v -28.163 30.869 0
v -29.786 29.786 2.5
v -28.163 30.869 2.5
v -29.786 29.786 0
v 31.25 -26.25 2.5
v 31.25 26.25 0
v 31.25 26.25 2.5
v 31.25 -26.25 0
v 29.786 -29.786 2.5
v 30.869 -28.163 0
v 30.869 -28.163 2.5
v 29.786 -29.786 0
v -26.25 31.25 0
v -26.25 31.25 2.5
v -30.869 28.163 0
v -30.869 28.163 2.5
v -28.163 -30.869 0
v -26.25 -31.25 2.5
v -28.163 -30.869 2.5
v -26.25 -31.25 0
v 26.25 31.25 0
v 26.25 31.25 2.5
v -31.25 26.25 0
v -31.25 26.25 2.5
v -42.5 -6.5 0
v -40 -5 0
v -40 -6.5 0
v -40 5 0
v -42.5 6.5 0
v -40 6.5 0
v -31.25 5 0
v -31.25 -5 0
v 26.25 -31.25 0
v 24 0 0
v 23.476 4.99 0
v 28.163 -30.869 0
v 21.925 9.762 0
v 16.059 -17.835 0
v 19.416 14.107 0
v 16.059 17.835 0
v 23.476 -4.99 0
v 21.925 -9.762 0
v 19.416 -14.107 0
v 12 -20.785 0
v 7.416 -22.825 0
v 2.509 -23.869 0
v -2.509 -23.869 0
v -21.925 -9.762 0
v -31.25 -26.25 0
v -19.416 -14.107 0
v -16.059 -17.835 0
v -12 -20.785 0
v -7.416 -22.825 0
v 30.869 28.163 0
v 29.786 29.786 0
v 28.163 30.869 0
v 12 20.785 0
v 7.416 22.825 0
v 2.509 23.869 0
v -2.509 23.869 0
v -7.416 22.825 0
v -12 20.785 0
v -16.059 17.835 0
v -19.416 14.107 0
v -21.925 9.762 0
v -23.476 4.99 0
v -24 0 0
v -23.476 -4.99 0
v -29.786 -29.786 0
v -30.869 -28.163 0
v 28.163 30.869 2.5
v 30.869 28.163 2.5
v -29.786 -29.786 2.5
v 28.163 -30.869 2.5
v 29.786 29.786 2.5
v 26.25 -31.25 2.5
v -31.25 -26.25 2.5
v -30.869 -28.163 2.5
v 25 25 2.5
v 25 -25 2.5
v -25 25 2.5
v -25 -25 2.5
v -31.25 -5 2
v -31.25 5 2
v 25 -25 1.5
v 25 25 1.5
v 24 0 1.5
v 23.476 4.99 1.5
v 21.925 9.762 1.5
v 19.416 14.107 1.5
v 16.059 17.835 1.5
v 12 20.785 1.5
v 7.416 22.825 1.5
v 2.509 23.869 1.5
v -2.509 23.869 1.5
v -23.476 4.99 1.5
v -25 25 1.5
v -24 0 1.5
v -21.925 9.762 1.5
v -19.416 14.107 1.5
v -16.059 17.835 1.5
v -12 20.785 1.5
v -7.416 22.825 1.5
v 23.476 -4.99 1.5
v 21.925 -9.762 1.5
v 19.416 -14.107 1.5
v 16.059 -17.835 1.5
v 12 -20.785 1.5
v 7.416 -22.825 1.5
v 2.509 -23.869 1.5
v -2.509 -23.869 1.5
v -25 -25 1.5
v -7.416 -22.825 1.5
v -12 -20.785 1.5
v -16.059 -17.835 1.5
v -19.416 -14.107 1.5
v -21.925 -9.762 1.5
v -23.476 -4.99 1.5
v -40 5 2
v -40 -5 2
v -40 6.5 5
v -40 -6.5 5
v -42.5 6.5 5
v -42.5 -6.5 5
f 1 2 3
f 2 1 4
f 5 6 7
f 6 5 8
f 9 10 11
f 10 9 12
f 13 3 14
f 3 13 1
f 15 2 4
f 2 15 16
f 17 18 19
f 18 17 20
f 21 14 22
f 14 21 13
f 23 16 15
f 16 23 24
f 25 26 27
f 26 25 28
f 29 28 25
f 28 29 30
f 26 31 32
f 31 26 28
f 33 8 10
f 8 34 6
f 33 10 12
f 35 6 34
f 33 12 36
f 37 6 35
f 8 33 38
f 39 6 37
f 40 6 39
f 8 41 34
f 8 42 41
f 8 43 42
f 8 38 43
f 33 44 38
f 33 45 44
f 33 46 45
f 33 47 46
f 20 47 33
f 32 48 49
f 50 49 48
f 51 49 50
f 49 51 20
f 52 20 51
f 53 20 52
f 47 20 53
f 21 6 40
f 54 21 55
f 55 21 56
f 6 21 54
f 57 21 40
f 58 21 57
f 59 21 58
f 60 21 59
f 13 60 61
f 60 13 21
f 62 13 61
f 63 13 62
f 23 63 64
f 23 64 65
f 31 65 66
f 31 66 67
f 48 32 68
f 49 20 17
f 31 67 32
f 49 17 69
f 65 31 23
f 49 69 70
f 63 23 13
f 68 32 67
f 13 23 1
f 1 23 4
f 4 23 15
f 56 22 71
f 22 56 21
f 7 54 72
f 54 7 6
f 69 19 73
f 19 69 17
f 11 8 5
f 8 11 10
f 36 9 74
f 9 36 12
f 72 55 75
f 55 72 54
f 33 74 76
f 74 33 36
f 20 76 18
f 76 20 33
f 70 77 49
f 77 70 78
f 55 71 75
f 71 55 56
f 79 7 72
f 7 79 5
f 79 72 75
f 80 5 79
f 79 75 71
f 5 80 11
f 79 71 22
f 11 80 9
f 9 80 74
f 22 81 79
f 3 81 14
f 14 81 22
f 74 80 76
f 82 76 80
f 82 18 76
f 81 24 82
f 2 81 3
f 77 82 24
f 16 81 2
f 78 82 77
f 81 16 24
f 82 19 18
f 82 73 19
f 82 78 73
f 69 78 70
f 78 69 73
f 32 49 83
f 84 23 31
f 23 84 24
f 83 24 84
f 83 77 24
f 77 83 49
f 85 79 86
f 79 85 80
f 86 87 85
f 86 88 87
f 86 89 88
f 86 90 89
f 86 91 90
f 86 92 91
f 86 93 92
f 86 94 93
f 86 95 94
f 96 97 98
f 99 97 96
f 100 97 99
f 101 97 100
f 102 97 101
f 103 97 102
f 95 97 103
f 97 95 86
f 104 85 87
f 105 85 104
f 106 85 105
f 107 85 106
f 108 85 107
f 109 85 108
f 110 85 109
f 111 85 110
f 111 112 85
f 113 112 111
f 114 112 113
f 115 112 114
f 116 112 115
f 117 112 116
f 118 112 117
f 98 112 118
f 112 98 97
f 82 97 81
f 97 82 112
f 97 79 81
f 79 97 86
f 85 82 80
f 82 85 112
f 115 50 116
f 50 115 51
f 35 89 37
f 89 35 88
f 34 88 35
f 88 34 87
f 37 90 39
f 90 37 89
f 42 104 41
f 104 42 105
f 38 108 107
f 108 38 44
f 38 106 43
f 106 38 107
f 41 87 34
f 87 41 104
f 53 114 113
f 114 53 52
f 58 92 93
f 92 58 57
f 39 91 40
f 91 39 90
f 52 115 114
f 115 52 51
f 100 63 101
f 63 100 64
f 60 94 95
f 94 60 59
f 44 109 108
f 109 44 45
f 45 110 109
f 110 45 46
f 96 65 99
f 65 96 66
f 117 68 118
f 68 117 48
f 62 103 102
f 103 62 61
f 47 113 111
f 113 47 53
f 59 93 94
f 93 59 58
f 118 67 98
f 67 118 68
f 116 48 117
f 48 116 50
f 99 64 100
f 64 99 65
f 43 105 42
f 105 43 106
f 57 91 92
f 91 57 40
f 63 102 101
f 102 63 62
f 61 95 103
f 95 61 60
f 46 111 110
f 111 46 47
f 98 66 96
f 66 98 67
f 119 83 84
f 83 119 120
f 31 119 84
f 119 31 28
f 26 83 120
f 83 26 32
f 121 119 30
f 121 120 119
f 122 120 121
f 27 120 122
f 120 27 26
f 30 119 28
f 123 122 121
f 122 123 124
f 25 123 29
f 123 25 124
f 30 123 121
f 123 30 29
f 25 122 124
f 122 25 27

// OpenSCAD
// file: lib.scad
use <lib.scad>

module trayOuter(
  w,
  d,
  h,
  cornerRadius=5,
) {
    translate([(w * -0.5),(d * -0.5),0]){
      minkowski(){
        cube([w,d,(h/2)]);
        cylinder(r=cornerRadius,h=(h/2));
    }
  }
}

module trayInner(
  w,
  h,
  cornerRadius=2,
) {
    translate([((w-cornerRadius) * -0.5),((w-cornerRadius) * -0.5),0]){
      minkowski(){
        cube([(w-cornerRadius),(w-cornerRadius),(h/2)]);
        cylinder(r=cornerRadius,h=(h/2));
      }
    }
}

module trayInsert(
  w,
  h,
  filterSize,
  cornerRadius=2,
) {
    difference(){
      union(){       
        trayInner(w,h,cornerRadius);
        for (i = [0, 90, 180, 270]){
          rotate([0, 0, i]){
            translate([(w/2 - 1),0,(h/2)]){
              cylinder(h,r=3,center=true);
            };
          };
        };            
      };
      cylinder(h=10,r=(filterSize/2 - 1),center=true);
    };
};


module filterHolder(
  width, 
  depth, 
  height, 
  filterSize
) {
  union(){
      // tray
      difference(){
        difference(){
          // tray outer
          trayOuter(w=width,d=depth,h=height);
          // tray inner void (1.5 is the thickness of the bottom plate)
          translate([0,0,1.5]){
            trayInner(w=filterSize,h=height,cornerRadius=0);
          }
        };
        // central hole
        cylinder(h=10,r=(filterSize/2 - 1),center=true);
      }

      // handle
      translate([(-width/2 -10),0,1]){
          union(){
              //stem
              cube([11,10,2],center=true);
              //handle
              translate([-5,0,1.5]){
                  cube([2.5,13,5],center=true);
              }
          }
      }
  }
};


filterHolder(
  width=52.5,
  depth=52.5,
  height=2.5,
  filterSize=50
);

translate([60,0,0]){
  trayInsert(
    w=50,
    h=1.5,
    filterSize=50
  );
};
// main file
use <lib.scad>

filterHolder(
  width=52.5,
  depth=52.5,
  height=2.5,
  filterSize=50
);
